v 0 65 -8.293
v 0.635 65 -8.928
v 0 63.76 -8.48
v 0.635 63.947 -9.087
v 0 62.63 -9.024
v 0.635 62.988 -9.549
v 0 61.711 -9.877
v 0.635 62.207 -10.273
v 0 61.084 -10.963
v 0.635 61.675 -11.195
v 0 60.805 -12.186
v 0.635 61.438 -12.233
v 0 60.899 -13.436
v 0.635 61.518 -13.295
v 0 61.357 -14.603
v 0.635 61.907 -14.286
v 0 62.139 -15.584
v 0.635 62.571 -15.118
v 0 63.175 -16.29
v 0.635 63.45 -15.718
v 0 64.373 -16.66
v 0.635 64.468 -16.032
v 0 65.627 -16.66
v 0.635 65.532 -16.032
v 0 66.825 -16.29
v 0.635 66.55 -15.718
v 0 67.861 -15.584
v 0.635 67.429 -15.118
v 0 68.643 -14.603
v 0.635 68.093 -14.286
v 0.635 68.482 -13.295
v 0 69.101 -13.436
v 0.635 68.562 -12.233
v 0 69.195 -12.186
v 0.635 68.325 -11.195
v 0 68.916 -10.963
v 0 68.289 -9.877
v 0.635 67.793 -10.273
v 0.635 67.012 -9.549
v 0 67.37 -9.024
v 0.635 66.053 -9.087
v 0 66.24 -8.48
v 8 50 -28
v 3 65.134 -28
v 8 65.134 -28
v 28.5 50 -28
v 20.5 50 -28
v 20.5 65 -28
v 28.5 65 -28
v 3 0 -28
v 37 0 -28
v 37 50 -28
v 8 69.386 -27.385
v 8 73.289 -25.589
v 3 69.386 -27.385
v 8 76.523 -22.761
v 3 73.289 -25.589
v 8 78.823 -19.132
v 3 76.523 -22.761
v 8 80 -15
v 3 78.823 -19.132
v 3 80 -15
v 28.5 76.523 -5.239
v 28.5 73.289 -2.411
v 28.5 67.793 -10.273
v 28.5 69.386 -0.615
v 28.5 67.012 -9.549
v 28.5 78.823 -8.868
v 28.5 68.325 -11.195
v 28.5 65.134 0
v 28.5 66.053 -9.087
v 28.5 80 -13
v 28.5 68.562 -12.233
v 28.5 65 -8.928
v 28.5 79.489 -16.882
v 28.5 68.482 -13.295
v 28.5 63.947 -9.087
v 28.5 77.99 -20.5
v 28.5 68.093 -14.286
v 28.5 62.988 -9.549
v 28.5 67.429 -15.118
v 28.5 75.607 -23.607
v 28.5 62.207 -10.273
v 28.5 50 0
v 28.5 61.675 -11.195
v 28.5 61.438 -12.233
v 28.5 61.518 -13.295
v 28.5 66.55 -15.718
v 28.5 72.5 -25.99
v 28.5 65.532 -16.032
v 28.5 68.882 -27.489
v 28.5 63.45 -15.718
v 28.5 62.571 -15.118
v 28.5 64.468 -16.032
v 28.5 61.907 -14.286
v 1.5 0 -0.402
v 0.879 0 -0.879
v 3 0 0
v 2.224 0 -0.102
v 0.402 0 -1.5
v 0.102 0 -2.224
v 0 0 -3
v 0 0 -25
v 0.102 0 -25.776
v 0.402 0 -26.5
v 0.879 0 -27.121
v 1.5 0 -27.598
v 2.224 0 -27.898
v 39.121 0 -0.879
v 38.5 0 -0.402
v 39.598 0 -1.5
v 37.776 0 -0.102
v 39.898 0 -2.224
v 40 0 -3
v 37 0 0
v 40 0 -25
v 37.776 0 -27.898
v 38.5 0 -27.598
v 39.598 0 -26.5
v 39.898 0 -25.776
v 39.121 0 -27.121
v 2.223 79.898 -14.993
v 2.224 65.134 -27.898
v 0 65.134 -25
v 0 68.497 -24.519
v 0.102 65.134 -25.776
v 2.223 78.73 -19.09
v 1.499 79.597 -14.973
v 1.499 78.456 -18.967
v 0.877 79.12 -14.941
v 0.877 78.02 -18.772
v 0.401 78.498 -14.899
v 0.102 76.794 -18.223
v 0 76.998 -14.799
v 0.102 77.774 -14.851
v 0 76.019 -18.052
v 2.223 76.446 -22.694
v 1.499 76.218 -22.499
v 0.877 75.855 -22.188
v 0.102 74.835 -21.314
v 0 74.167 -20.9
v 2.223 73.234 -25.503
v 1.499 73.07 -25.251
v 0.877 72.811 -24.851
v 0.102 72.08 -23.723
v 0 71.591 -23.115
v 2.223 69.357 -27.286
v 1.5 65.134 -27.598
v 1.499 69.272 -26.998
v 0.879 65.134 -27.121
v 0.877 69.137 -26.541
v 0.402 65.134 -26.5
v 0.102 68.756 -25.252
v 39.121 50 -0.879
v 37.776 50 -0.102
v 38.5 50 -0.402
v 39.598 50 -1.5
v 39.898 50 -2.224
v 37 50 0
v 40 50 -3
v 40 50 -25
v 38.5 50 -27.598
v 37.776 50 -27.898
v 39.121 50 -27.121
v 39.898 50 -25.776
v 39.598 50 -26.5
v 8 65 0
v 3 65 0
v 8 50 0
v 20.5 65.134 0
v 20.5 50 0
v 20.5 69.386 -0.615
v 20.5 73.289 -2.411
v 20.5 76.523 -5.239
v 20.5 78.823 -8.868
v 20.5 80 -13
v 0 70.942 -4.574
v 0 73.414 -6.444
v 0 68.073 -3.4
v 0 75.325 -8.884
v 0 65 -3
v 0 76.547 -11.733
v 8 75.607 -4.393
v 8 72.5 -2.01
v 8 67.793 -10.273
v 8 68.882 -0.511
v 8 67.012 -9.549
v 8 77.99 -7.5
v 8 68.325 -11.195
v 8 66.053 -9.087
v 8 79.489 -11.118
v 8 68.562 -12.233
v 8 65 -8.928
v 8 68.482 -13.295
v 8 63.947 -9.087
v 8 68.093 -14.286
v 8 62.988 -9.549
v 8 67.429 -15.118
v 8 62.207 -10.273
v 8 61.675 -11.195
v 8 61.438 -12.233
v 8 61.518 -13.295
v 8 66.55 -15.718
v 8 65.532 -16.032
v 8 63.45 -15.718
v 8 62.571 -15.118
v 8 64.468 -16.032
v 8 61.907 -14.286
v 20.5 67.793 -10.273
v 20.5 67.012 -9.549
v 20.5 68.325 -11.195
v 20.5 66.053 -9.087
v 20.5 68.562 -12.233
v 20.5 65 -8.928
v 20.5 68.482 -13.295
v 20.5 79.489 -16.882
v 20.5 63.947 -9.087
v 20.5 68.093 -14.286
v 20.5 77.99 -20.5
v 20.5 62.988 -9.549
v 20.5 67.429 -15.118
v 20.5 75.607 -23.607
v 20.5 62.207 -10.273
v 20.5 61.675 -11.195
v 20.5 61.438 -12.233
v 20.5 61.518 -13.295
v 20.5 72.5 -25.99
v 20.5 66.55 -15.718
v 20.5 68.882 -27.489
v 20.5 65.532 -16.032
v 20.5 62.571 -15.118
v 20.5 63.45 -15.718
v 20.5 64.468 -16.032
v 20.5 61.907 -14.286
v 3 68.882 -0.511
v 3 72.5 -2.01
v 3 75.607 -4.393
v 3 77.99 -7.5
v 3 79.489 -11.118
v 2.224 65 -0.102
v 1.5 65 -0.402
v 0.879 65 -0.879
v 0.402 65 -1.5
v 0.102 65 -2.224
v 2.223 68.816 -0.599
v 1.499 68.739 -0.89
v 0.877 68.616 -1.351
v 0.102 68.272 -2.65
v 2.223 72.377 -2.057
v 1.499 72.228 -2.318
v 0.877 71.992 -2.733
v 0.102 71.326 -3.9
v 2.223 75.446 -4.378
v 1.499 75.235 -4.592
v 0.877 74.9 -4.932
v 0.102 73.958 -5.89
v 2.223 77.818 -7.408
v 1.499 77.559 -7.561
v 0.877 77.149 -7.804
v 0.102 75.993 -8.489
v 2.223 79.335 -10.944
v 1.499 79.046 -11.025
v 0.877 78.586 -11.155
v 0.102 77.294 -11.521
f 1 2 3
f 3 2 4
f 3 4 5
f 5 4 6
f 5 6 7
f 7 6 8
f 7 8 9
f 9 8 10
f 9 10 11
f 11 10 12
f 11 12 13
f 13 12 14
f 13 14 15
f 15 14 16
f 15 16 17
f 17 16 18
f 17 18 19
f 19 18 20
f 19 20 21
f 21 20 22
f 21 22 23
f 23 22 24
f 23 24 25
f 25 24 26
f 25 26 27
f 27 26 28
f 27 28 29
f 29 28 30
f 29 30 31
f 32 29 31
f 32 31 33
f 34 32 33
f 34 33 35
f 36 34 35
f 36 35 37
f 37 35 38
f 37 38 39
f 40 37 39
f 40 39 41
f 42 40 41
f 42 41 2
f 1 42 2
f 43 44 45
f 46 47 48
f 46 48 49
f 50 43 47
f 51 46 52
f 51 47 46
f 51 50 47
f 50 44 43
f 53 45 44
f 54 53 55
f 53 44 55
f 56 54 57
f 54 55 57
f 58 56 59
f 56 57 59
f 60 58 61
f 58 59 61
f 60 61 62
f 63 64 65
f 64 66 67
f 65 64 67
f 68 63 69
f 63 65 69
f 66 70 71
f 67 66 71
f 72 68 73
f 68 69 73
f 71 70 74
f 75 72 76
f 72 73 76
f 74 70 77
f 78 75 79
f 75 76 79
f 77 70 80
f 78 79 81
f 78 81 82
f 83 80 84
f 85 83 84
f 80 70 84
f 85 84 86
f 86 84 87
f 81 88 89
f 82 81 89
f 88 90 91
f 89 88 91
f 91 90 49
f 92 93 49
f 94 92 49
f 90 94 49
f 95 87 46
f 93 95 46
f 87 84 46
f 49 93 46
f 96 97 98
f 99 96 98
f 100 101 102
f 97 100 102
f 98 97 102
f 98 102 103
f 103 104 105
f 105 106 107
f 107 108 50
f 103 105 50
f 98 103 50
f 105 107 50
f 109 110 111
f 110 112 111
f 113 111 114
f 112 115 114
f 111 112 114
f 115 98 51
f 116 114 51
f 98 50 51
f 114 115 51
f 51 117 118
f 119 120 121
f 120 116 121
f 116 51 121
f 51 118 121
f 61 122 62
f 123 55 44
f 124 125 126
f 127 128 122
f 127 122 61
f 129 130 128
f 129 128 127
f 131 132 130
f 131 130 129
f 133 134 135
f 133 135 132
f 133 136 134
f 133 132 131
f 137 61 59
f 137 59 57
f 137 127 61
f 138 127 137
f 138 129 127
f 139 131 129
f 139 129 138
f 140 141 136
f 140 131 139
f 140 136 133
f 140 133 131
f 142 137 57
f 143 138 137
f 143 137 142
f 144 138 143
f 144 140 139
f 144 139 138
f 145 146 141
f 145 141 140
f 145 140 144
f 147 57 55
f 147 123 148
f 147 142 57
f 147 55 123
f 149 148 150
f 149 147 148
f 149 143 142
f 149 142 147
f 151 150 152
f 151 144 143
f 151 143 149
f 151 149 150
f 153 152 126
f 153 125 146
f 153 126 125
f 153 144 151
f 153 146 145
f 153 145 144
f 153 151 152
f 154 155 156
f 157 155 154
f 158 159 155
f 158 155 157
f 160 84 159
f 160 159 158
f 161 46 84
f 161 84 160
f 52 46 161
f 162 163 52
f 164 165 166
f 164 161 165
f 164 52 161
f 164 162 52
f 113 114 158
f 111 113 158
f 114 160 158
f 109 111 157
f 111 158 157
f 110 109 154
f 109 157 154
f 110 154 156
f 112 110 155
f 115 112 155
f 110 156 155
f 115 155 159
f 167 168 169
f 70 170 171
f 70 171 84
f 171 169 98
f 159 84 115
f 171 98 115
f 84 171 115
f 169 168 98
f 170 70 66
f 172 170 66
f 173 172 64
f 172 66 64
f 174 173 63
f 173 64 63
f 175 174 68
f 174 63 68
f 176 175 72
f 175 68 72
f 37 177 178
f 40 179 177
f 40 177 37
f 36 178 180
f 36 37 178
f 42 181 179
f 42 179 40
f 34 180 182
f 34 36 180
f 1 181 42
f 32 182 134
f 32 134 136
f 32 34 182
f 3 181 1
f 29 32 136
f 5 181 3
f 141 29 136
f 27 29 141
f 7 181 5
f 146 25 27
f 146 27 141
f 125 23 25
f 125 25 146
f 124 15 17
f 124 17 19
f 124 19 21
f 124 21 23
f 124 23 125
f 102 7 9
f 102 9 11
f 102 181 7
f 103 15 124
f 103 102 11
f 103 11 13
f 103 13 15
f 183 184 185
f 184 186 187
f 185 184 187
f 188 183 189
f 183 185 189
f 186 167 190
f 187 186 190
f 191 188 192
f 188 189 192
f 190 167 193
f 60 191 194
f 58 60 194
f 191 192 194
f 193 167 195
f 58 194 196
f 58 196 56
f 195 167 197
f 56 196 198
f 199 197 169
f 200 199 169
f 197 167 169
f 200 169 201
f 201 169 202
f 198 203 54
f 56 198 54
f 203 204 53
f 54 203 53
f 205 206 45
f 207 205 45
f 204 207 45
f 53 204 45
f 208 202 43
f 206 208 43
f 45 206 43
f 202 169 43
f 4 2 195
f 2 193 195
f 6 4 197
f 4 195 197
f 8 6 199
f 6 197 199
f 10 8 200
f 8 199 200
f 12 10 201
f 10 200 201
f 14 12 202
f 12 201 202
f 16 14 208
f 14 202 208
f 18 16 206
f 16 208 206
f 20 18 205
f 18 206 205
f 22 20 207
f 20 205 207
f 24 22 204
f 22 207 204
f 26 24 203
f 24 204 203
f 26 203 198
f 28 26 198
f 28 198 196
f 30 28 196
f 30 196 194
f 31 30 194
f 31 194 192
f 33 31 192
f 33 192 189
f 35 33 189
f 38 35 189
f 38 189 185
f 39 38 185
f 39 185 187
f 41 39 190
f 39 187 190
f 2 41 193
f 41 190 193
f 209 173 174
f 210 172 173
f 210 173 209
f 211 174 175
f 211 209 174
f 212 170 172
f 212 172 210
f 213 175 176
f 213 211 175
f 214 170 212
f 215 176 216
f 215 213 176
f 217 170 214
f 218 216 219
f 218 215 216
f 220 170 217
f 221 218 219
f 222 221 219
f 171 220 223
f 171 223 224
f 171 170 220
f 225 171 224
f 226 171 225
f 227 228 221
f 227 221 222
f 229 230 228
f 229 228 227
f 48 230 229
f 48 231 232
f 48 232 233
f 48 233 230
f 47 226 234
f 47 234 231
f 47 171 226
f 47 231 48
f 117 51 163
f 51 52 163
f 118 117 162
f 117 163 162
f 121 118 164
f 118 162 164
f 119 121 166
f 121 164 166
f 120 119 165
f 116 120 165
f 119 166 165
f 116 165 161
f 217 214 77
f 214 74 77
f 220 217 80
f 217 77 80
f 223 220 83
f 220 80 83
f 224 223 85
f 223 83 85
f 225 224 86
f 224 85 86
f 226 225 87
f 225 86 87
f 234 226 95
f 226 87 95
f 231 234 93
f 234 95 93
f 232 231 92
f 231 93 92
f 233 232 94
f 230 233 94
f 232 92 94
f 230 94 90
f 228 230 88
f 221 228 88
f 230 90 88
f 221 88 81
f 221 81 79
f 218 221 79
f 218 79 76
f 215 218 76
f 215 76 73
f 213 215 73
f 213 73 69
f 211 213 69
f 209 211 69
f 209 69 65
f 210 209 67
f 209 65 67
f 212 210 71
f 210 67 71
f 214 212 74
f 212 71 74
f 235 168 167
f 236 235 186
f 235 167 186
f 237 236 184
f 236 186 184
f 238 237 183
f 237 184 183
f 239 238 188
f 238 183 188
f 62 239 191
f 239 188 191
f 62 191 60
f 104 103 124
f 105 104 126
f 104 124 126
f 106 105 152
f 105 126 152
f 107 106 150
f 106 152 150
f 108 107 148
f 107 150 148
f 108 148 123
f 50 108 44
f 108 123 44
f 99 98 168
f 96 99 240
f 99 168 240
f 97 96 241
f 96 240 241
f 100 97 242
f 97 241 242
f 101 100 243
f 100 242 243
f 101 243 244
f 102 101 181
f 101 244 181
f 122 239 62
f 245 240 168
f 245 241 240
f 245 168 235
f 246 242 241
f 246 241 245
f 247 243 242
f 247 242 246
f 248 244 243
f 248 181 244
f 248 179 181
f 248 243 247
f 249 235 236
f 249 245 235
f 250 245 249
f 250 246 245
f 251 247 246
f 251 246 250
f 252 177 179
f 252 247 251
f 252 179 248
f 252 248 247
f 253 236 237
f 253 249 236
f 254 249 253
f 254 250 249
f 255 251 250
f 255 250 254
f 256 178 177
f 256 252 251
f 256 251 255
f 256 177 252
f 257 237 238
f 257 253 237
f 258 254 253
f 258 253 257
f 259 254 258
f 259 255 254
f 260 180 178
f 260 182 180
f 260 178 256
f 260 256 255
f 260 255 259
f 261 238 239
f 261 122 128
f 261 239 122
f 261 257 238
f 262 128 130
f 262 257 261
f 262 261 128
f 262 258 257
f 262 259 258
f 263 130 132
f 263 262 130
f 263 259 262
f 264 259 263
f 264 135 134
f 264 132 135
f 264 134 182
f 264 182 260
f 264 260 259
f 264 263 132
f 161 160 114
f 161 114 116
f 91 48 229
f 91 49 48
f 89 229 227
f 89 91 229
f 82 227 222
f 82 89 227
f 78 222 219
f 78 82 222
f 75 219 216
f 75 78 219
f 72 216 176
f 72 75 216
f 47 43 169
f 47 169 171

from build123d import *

# Parameters (mm, degrees)
SKETCH2_W                                 = 40
SKETCH2_H                                 = 28
BOSS_EXTRUDE2_DEPTH                       = 50
SKETCH3_W                                 = 8
SKETCH3_H                                 = 28
BOSS_EXTRUDE3_DEPTH                       = 30
F_9_32_0_28125_DIAMETER_HOLE1_D           = 7.14375
F_9_32_0_28125_DIAMETER_HOLE1_CSINK_D     = 8.41375
F_9_32_0_28125_DIAMETER_HOLE1_CSINK_ANGLE = 90
FILLET5_R                                 = 15
FILLET3_R                                 = 15
FILLET4_R                                 = 15
FILLET6_R                                 = 15
FILLET7_R                                 = 3
FILLET8_R                                 = 3


with BuildPart() as part:
    # Sketch2 → Boss-Extrude2 (new body)
    with BuildSketch(Plane(origin=(0, 0, 0), x_dir=(1, 0, 0), z_dir=(0, 1, 0))):
        with Locations((20, 14)):
            Rectangle(SKETCH2_W, SKETCH2_H)
    extrude(amount=BOSS_EXTRUDE2_DEPTH)

    # Sketch3 → Boss-Extrude3 (add)
    with BuildSketch(Plane(origin=(0, 50, 0), x_dir=(1, 0, 0), z_dir=(0, 1, 0))):
        with Locations((4, 14)):
            Rectangle(SKETCH3_W, SKETCH3_H)
        with Locations((24.5, 14)):
            Rectangle(SKETCH3_W, SKETCH3_H)
    extrude(amount=BOSS_EXTRUDE3_DEPTH)

    # 9/32 (0.28125) Diameter Hole1 (through all)
    with Locations(Plane(origin=(0, 65, -12.5), x_dir=(0, 0, -1), z_dir=(-1, 0, 0))):
        with Locations((0, 0)):
            CounterSinkHole(F_9_32_0_28125_DIAMETER_HOLE1_D / 2, F_9_32_0_28125_DIAMETER_HOLE1_CSINK_D / 2, counter_sink_angle=F_9_32_0_28125_DIAMETER_HOLE1_CSINK_ANGLE)

    # Fillet5
    fillet5_edges = [part.edges().sort_by_distance(p)[0] for p in [
        (4, 80, 0),
    ]]
    fillet(fillet5_edges, radius=FILLET5_R)

    # Fillet3
    fillet3_edges = [part.edges().sort_by_distance(p)[0] for p in [
        (24.5, 80, -28),
    ]]
    fillet(fillet3_edges, radius=FILLET3_R)

    # Fillet4
    # the kernel refuses this fillet: 15 mm, written as the material it takes off along each edge
    with BuildSketch(Plane(origin=(65.665171868, 80, 0), x_dir=(0, 0, -1), z_dir=(-1, 0, 0))) as fillet4_piece_1:
        with BuildLine():
            CenterArc((15, 14.866068747), FILLET4_R, 180, 82.337744339)
            Line((0, 14.866068747), (-0.3, 14.866068747))
            Line((-0.3, 14.866068747), (-0.3, 0))
            Line((-0.3, 0), (0, -0.3))
            ThreePointArc((0, -0.3), (6.5, -0.3), (12.96, -0.297321375))
            Line((12.96, -0.297321375), (13, 0))
        make_face()
    extrude(amount=82.330343737, mode=Mode.SUBTRACT)

    # Fillet6
    # the kernel refuses this fillet: 15 mm, written as the material it takes off along each edge
    with BuildSketch(Plane(origin=(-37.165171868, 80, -28), x_dir=(0, -1, 0), z_dir=(1, 0, 0))) as fillet6_piece_1:
        with BuildLine():
            CenterArc((14.866068747, -15), FILLET6_R, 90, 82.337744339)
            Line((0, -13), (-0.297321375, -12.96))
            ThreePointArc((-0.297321375, -12.96), (-0.3, -6.5), (-0.3, 0))
            Line((-0.3, 0), (0, 0.3))
            Line((0, 0.3), (14.866068747, 0.3))
            Line((14.866068747, 0.3), (14.866068747, 0))
        make_face()
    extrude(amount=82.330343737, mode=Mode.SUBTRACT)

    # Fillet7
    # the kernel refuses this fillet: 3 mm, written as the material it takes off along each edge
    with BuildSketch(Plane(origin=(0, 65, 0), x_dir=(1, 0, 0), z_dir=(0, -1, 0))) as fillet7_piece_1:
        with BuildLine():
            CenterArc((FILLET7_R, -FILLET7_R), FILLET7_R, 90, 90)
            Line((0, -FILLET7_R), (0, 0))
            Line((0, 0), (FILLET7_R, 0))
        make_face()
    extrude(amount=72.5, mode=Mode.SUBTRACT)
    with BuildSketch(Plane(origin=(0, 65, -15), x_dir=(0, 0, 1), z_dir=(0, -1, 0))) as fillet7_piece_2:
        with BuildLine():
            CenterArc((15 - FILLET7_R, -FILLET7_R), FILLET7_R, 0, 90)
            Line((15, -FILLET7_R), (15, 0))
            Line((15, 0), (15 - FILLET7_R, 0))
        make_face()
    revolve(axis=Axis((0, 65, -15), (-1, 0, 0)), revolution_arc=118.659397847, mode=Mode.SUBTRACT)
    with BuildSketch(Plane(origin=(0, 65.133931253, -28), x_dir=(1, 0, 0), z_dir=(0, -1, 0))) as fillet7_piece_3:
        with BuildLine():
            CenterArc((FILLET7_R, FILLET7_R), FILLET7_R, 180, 90)
            Line((0, FILLET7_R), (0, 0))
            Line((0, 0), (FILLET7_R, 0))
        make_face()
    extrude(amount=72.633931253, mode=Mode.SUBTRACT)
    with BuildSketch(Plane(origin=(0, 65.133931253, -13), x_dir=(0, 0.933610035263845, 0.3582908065449657), z_dir=(0, -0.3582908065449657, 0.933610035263845))) as fillet7_piece_4:
        with BuildLine():
            CenterArc((15 - FILLET7_R, -FILLET7_R), FILLET7_R, 360, 90)
            Line((15, -FILLET7_R), (15, 0))
            Line((15, 0), (15 - FILLET7_R, 0))
        make_face()
    revolve(axis=Axis((0, 65.133931253, -13), (-1, 0, 0)), revolution_arc=110.995265648, mode=Mode.SUBTRACT)

    # Fillet8
    fillet8_edges = [part.edges().sort_by_distance(p)[0] for p in [
        (40, 25, -28),
        (40, 25, 0),
    ]]
    fillet(fillet8_edges, radius=FILLET8_R)


solid = part.part
